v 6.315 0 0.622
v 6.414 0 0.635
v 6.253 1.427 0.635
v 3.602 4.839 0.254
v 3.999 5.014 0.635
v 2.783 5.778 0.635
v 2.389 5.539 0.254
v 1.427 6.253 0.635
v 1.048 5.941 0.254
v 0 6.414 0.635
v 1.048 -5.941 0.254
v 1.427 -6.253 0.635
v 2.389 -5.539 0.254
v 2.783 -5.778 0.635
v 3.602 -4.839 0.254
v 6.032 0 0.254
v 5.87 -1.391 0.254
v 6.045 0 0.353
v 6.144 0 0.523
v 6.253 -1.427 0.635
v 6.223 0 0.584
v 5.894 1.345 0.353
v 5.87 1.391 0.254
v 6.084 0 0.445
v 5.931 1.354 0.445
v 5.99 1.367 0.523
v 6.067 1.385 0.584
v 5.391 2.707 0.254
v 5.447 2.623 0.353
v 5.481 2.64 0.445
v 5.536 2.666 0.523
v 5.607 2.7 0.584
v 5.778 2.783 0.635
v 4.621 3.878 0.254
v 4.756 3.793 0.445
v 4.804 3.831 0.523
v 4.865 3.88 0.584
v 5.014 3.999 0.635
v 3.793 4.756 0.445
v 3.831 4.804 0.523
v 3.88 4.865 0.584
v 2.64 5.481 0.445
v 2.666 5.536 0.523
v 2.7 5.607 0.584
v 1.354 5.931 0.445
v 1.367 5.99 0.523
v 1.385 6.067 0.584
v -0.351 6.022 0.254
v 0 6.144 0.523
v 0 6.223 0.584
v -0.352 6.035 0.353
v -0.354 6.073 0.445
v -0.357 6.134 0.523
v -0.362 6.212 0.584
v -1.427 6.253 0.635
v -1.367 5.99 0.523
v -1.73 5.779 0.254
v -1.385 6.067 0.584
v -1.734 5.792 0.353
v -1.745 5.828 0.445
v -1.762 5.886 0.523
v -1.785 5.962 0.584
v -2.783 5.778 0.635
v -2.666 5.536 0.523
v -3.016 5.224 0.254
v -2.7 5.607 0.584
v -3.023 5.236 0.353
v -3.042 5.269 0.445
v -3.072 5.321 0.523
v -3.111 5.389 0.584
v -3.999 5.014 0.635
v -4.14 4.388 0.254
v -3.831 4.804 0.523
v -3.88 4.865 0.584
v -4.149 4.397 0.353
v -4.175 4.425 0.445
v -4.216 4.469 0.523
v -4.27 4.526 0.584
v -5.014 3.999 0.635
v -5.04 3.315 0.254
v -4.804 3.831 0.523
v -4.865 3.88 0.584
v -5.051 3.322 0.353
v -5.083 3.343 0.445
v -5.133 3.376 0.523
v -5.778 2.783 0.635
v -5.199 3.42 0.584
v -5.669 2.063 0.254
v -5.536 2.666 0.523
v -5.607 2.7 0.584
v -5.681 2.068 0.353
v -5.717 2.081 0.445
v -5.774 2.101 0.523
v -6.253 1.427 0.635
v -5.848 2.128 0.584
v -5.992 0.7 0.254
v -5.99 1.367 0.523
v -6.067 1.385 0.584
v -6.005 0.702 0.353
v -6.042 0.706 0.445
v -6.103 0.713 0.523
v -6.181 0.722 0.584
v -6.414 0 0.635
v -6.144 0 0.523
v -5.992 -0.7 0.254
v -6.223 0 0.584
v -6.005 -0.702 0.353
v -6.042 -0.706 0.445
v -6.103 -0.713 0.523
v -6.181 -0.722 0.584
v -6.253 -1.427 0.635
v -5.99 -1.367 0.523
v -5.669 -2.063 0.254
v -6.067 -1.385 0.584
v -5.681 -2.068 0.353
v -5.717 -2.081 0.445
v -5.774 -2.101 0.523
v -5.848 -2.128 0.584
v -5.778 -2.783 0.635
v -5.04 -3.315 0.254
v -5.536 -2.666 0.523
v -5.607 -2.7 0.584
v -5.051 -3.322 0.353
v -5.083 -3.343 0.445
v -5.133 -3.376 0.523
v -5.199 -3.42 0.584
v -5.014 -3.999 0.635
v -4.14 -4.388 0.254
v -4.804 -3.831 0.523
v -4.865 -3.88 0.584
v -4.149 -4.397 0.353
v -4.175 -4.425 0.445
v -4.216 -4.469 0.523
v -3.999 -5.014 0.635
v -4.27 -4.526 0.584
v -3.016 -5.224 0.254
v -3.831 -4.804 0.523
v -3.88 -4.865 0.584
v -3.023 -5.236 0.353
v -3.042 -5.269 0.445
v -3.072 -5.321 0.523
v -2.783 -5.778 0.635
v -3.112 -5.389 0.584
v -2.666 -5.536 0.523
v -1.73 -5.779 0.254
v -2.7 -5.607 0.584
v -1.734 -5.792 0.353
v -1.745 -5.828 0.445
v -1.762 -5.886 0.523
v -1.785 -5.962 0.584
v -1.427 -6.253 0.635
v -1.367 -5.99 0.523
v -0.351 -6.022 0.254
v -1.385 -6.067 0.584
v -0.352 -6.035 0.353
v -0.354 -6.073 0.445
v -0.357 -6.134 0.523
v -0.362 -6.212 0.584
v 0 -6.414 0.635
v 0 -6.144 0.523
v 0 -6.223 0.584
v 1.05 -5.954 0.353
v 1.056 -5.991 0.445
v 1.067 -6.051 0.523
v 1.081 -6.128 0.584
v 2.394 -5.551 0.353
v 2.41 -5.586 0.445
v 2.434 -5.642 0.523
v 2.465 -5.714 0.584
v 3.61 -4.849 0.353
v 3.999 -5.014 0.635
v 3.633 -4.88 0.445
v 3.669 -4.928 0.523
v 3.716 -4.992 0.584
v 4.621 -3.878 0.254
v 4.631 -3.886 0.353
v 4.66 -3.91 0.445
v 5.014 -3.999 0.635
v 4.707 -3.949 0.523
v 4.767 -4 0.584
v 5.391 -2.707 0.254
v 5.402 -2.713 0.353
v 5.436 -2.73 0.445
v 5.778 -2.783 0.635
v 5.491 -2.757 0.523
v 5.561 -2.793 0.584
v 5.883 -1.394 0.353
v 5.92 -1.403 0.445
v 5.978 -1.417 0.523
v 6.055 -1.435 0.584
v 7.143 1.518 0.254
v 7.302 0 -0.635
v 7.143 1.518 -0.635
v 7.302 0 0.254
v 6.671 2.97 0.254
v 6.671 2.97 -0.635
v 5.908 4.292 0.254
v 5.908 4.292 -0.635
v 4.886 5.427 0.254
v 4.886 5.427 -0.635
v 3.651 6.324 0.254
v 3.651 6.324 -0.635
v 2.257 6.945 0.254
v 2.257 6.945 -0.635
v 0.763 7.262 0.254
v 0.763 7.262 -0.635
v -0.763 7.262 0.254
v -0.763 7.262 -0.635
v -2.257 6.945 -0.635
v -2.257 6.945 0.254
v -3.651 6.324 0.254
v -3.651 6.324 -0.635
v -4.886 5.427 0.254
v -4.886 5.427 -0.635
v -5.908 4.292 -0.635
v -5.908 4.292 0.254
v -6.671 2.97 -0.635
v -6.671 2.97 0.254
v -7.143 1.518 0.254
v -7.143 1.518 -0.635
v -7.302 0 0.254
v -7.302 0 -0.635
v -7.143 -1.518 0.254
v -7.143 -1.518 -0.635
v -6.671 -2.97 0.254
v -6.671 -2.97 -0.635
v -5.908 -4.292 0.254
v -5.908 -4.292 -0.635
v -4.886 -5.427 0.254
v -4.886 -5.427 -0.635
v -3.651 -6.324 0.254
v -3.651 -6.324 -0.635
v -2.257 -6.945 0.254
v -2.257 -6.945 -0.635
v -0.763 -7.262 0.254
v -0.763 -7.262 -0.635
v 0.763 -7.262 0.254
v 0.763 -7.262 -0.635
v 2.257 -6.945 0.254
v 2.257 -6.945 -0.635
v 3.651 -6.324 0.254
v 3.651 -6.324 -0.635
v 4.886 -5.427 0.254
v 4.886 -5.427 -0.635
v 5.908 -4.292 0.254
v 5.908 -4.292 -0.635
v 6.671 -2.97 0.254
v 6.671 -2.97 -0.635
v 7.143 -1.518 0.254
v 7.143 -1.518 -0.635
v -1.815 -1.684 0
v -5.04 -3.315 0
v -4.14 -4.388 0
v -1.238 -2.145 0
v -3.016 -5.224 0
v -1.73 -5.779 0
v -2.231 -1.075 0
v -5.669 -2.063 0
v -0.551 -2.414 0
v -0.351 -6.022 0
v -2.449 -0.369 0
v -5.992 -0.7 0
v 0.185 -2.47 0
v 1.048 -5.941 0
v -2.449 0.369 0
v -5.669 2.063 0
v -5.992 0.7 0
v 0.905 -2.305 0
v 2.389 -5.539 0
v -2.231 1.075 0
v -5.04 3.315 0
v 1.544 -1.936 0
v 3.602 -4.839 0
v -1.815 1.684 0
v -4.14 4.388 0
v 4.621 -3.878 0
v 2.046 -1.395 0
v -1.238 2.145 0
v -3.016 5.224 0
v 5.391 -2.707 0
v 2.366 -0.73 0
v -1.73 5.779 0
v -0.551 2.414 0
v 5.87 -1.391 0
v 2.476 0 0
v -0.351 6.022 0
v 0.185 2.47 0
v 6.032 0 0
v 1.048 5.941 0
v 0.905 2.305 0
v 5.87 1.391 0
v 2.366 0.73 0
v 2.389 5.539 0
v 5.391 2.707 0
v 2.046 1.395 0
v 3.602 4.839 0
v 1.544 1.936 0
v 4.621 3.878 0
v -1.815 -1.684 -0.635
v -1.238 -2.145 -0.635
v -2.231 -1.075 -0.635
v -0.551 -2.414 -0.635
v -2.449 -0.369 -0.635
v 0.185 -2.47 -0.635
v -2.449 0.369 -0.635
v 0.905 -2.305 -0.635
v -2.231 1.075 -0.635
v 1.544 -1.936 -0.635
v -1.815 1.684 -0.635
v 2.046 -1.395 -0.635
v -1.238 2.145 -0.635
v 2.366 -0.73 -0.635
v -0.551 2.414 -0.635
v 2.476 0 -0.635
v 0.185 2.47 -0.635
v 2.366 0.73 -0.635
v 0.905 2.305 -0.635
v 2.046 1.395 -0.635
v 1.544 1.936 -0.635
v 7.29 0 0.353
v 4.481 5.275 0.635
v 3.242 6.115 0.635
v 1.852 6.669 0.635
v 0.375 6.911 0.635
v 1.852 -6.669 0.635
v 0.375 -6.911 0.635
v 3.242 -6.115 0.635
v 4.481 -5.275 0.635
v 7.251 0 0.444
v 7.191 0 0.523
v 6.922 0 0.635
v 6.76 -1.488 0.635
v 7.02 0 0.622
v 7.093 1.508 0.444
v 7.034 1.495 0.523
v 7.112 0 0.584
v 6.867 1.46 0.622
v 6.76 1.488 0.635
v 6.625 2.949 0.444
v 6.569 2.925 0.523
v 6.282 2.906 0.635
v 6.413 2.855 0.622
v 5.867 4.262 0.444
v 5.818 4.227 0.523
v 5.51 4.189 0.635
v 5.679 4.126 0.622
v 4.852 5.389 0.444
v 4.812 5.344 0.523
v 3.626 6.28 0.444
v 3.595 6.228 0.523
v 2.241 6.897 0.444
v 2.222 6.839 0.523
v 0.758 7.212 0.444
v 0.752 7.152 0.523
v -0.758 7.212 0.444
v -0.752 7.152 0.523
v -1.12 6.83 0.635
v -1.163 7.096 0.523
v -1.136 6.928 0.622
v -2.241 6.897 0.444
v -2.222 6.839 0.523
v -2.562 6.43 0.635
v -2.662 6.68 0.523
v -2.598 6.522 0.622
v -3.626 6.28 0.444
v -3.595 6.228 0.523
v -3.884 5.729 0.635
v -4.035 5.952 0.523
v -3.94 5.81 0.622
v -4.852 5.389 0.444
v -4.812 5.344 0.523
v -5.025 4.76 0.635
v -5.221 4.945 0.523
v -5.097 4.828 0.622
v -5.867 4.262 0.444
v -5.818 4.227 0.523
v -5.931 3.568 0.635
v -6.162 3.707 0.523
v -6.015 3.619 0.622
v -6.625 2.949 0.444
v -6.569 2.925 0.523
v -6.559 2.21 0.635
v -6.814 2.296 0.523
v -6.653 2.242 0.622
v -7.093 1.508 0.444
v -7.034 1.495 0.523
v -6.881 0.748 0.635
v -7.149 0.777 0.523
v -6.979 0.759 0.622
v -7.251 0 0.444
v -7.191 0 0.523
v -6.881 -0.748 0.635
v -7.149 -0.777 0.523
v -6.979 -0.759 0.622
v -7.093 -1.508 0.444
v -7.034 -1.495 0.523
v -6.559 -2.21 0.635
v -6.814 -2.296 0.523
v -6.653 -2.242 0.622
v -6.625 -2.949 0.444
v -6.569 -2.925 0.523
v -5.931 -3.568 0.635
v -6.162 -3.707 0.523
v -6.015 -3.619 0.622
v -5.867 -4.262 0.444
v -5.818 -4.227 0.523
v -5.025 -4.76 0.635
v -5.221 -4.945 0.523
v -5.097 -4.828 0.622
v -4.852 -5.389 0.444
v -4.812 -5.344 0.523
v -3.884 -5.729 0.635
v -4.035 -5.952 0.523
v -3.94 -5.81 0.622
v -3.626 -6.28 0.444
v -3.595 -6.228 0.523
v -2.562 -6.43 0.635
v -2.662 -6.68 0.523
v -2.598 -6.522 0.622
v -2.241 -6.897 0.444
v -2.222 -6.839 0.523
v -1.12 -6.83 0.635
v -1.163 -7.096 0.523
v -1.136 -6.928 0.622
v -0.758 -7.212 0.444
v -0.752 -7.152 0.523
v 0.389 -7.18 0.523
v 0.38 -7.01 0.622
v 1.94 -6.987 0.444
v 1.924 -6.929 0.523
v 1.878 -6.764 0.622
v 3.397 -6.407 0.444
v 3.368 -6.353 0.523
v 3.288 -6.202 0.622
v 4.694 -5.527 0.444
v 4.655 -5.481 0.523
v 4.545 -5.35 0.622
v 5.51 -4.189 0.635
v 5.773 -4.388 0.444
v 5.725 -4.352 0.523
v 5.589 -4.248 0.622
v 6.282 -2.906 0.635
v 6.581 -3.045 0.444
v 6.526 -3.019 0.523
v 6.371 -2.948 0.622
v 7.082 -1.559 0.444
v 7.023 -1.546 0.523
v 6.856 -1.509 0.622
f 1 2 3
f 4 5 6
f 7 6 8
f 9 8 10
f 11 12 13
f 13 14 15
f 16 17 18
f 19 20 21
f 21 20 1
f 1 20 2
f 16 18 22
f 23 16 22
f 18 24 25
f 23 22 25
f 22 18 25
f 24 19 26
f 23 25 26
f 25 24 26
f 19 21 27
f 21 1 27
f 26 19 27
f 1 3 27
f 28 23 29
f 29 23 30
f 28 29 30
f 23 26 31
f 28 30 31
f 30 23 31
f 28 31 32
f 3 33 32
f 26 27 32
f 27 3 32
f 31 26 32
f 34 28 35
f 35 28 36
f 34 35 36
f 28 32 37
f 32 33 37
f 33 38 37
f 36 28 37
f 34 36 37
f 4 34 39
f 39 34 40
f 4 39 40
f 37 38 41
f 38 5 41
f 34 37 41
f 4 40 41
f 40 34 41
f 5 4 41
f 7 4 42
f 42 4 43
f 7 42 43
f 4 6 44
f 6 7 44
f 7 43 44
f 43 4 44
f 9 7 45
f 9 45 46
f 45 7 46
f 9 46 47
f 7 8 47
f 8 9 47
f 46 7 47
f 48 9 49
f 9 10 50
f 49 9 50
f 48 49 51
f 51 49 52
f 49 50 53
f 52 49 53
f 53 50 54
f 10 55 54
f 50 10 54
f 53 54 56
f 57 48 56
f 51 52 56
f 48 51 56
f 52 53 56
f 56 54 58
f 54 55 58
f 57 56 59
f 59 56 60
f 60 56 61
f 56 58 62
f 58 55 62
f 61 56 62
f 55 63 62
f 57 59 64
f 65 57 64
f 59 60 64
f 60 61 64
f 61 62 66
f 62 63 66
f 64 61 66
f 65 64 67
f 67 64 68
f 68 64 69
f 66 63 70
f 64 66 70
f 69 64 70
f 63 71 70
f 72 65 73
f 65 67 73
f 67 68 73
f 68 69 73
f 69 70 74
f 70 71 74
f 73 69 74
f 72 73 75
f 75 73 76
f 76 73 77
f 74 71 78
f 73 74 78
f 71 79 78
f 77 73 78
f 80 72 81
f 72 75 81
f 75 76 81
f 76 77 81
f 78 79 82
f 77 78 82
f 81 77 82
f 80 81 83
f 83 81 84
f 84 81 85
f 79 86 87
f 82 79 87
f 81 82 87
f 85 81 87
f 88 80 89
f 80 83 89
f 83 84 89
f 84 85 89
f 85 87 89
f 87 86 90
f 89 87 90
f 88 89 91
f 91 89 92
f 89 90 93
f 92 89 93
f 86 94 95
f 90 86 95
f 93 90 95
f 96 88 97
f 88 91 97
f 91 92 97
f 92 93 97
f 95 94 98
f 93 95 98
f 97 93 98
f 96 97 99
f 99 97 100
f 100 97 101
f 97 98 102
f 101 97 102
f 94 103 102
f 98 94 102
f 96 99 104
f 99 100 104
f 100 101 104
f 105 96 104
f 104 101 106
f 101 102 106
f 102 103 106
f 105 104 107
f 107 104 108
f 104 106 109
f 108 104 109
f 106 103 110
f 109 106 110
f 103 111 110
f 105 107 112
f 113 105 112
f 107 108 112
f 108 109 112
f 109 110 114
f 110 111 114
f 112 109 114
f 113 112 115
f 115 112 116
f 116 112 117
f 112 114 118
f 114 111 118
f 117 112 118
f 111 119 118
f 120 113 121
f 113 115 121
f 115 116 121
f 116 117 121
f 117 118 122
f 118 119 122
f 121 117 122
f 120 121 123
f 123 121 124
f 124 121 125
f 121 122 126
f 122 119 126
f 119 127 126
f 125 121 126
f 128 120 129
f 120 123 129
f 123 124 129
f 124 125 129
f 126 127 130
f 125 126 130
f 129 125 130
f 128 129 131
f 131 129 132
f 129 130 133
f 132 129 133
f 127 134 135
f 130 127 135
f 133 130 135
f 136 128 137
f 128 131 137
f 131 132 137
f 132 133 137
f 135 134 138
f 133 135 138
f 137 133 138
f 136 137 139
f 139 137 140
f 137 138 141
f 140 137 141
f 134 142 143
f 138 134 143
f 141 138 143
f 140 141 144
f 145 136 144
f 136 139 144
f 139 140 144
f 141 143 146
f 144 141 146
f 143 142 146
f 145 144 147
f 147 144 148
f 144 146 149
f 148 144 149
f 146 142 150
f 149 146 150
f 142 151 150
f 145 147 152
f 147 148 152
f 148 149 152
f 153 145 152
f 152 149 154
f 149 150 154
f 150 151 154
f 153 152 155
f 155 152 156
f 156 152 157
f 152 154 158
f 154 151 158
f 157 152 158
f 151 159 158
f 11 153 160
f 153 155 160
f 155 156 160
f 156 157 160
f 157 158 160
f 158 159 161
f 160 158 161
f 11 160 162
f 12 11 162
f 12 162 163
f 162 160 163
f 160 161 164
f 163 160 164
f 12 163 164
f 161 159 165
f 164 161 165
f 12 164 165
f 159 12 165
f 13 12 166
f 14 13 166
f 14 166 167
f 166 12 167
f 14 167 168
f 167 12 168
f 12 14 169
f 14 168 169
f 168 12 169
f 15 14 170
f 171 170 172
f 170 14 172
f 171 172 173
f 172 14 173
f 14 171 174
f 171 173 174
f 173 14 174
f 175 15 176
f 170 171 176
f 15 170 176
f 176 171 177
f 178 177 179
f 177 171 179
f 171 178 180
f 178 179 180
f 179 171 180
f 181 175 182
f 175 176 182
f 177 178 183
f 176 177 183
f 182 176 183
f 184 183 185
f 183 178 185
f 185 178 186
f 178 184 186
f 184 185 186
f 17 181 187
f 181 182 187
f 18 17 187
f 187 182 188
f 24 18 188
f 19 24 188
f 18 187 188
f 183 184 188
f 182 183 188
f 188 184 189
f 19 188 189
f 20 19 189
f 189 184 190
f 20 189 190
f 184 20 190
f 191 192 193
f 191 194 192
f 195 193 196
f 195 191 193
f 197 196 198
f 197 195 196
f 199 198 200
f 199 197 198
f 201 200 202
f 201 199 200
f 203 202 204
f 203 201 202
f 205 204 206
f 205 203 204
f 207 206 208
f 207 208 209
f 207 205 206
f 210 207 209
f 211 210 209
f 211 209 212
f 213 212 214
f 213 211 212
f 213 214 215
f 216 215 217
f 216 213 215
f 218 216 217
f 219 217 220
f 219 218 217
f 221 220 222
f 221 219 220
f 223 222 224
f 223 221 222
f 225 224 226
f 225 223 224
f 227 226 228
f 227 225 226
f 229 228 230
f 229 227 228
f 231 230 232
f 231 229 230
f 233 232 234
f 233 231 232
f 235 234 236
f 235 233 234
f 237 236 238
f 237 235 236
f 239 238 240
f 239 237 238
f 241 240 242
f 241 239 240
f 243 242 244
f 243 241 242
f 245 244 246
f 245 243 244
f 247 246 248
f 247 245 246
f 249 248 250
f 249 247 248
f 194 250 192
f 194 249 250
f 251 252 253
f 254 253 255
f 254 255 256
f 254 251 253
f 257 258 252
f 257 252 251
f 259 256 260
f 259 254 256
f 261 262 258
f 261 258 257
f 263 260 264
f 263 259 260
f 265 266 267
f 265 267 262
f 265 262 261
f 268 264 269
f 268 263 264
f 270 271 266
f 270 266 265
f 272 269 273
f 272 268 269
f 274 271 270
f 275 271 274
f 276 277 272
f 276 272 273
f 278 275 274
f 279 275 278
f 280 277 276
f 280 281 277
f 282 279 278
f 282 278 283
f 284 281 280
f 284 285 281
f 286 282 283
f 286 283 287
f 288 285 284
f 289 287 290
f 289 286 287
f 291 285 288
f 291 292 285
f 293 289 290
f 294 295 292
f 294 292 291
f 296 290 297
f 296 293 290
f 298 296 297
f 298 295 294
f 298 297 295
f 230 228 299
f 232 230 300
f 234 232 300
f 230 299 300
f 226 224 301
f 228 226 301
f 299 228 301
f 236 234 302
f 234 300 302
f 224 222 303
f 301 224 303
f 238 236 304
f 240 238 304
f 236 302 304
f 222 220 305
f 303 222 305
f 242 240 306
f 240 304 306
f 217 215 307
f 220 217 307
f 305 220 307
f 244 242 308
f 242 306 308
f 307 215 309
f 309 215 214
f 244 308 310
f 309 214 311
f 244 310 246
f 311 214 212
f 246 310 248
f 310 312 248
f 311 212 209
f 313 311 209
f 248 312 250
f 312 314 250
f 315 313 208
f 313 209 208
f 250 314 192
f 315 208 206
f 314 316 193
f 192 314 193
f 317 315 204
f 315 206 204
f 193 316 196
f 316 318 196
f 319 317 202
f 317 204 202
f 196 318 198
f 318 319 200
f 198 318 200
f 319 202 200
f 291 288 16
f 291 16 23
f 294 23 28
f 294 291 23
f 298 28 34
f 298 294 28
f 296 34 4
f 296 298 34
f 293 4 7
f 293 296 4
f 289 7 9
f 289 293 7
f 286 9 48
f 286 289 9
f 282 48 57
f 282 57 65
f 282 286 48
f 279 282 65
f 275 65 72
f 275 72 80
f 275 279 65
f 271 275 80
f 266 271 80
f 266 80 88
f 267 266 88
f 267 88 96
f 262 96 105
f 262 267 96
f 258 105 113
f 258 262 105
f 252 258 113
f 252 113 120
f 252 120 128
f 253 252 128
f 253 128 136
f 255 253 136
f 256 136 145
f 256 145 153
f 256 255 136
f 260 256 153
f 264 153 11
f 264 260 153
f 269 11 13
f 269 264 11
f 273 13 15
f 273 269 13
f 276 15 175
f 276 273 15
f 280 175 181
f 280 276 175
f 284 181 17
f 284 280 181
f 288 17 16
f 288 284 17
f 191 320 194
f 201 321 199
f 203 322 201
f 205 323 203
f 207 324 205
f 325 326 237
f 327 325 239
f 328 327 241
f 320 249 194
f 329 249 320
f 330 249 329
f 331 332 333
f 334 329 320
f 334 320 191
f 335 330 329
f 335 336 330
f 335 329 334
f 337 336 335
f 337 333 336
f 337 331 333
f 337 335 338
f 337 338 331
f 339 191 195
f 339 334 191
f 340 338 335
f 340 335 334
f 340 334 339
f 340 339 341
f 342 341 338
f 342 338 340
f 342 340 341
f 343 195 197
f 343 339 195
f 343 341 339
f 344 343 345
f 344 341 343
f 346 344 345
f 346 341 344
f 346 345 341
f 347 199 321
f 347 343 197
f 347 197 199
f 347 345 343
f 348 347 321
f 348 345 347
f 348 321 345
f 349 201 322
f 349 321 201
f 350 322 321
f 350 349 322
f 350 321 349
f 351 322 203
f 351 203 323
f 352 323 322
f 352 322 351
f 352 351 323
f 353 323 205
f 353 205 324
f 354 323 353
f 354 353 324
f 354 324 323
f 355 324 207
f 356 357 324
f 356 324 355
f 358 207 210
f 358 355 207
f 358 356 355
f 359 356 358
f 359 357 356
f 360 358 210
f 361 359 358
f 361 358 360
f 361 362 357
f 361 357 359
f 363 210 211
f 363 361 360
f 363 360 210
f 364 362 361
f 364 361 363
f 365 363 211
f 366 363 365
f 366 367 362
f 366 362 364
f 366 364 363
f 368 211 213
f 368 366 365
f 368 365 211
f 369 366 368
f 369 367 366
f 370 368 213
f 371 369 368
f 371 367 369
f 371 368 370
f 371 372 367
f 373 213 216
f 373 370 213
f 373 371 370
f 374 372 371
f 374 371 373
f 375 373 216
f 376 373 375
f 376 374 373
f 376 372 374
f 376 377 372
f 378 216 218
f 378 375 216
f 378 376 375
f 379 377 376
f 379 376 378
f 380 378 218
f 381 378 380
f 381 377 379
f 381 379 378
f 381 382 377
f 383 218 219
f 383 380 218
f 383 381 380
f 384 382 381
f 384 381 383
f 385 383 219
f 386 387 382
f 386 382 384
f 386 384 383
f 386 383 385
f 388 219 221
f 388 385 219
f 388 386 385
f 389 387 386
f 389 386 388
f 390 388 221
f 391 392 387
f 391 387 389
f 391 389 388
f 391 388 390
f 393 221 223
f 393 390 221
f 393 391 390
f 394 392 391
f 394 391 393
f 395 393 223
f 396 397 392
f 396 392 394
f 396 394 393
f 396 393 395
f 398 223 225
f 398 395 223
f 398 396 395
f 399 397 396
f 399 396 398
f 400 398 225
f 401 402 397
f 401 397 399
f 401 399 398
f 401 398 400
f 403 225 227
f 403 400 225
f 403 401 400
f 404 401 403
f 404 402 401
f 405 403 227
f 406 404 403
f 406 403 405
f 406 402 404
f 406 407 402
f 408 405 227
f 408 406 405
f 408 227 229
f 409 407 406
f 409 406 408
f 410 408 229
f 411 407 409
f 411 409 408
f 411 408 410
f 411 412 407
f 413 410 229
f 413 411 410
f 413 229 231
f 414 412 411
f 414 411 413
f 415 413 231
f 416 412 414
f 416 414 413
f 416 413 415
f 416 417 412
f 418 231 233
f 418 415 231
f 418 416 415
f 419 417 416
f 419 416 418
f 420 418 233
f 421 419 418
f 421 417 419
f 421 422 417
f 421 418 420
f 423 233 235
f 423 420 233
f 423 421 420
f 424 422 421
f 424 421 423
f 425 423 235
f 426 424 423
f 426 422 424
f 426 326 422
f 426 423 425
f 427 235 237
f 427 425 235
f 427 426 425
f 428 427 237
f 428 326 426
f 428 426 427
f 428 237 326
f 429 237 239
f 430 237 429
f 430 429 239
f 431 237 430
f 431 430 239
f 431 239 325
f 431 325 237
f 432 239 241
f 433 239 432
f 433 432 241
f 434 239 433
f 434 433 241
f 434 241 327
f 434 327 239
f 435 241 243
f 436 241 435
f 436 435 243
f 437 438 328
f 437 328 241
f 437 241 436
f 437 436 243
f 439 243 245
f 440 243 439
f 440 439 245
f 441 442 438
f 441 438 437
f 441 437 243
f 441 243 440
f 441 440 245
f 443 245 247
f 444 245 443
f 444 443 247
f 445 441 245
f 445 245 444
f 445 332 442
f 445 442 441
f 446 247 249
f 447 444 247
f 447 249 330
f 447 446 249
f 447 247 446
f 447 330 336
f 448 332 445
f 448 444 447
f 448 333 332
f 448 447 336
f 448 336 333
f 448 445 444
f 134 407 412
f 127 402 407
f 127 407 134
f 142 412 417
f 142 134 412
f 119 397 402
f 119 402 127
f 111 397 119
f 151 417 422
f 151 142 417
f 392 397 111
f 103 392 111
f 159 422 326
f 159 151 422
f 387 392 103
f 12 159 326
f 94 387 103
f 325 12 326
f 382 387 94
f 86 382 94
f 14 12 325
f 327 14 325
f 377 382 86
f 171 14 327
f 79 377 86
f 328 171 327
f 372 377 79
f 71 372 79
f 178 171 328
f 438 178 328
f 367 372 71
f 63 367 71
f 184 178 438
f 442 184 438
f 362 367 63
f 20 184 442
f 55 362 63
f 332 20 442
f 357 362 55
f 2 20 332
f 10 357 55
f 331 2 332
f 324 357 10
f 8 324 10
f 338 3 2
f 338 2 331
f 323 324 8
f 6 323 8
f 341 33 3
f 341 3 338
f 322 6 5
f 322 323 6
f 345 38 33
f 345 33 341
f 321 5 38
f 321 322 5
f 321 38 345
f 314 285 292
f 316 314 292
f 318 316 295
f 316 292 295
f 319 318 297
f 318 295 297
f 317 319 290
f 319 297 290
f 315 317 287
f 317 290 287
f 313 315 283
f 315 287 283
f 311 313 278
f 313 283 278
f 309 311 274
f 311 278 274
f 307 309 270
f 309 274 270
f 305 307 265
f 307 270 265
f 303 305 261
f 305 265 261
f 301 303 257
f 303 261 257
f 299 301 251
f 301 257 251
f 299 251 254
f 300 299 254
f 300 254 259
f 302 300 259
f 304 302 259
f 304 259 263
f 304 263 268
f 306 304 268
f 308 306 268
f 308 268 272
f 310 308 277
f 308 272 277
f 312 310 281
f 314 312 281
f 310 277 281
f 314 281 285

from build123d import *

# Parameters (mm, degrees)
F0_R     = 7.3025
F0_R_2   = 6.0325
F1_DEPTH = 0.635
F2_R     = 0.381
F3_R     = 7.3025
F3_R_2   = 2.4765
F4_DEPTH = 0.635


with BuildPart() as f1:
    # F0 (on Top) → F1 (new body)
    with BuildSketch(Plane.XY):
        Circle(F0_R)
        Circle(F0_R_2, mode=Mode.SUBTRACT)
    extrude(amount=F1_DEPTH)

    # F2
    f2_edges = [f1.edges().sort_by_distance(p)[0] for p in [
        (-7.3025, 0, 0.635),
        (-6.0325, 0, 0.635),
    ]]
    fillet(f2_edges, radius=F2_R)

    # F3 (on Top) → F4 (join)
    with BuildSketch(Plane.XY):
        Circle(F3_R)
        Circle(F3_R_2, mode=Mode.SUBTRACT)
    extrude(amount=-F4_DEPTH)


solid = f1.part
